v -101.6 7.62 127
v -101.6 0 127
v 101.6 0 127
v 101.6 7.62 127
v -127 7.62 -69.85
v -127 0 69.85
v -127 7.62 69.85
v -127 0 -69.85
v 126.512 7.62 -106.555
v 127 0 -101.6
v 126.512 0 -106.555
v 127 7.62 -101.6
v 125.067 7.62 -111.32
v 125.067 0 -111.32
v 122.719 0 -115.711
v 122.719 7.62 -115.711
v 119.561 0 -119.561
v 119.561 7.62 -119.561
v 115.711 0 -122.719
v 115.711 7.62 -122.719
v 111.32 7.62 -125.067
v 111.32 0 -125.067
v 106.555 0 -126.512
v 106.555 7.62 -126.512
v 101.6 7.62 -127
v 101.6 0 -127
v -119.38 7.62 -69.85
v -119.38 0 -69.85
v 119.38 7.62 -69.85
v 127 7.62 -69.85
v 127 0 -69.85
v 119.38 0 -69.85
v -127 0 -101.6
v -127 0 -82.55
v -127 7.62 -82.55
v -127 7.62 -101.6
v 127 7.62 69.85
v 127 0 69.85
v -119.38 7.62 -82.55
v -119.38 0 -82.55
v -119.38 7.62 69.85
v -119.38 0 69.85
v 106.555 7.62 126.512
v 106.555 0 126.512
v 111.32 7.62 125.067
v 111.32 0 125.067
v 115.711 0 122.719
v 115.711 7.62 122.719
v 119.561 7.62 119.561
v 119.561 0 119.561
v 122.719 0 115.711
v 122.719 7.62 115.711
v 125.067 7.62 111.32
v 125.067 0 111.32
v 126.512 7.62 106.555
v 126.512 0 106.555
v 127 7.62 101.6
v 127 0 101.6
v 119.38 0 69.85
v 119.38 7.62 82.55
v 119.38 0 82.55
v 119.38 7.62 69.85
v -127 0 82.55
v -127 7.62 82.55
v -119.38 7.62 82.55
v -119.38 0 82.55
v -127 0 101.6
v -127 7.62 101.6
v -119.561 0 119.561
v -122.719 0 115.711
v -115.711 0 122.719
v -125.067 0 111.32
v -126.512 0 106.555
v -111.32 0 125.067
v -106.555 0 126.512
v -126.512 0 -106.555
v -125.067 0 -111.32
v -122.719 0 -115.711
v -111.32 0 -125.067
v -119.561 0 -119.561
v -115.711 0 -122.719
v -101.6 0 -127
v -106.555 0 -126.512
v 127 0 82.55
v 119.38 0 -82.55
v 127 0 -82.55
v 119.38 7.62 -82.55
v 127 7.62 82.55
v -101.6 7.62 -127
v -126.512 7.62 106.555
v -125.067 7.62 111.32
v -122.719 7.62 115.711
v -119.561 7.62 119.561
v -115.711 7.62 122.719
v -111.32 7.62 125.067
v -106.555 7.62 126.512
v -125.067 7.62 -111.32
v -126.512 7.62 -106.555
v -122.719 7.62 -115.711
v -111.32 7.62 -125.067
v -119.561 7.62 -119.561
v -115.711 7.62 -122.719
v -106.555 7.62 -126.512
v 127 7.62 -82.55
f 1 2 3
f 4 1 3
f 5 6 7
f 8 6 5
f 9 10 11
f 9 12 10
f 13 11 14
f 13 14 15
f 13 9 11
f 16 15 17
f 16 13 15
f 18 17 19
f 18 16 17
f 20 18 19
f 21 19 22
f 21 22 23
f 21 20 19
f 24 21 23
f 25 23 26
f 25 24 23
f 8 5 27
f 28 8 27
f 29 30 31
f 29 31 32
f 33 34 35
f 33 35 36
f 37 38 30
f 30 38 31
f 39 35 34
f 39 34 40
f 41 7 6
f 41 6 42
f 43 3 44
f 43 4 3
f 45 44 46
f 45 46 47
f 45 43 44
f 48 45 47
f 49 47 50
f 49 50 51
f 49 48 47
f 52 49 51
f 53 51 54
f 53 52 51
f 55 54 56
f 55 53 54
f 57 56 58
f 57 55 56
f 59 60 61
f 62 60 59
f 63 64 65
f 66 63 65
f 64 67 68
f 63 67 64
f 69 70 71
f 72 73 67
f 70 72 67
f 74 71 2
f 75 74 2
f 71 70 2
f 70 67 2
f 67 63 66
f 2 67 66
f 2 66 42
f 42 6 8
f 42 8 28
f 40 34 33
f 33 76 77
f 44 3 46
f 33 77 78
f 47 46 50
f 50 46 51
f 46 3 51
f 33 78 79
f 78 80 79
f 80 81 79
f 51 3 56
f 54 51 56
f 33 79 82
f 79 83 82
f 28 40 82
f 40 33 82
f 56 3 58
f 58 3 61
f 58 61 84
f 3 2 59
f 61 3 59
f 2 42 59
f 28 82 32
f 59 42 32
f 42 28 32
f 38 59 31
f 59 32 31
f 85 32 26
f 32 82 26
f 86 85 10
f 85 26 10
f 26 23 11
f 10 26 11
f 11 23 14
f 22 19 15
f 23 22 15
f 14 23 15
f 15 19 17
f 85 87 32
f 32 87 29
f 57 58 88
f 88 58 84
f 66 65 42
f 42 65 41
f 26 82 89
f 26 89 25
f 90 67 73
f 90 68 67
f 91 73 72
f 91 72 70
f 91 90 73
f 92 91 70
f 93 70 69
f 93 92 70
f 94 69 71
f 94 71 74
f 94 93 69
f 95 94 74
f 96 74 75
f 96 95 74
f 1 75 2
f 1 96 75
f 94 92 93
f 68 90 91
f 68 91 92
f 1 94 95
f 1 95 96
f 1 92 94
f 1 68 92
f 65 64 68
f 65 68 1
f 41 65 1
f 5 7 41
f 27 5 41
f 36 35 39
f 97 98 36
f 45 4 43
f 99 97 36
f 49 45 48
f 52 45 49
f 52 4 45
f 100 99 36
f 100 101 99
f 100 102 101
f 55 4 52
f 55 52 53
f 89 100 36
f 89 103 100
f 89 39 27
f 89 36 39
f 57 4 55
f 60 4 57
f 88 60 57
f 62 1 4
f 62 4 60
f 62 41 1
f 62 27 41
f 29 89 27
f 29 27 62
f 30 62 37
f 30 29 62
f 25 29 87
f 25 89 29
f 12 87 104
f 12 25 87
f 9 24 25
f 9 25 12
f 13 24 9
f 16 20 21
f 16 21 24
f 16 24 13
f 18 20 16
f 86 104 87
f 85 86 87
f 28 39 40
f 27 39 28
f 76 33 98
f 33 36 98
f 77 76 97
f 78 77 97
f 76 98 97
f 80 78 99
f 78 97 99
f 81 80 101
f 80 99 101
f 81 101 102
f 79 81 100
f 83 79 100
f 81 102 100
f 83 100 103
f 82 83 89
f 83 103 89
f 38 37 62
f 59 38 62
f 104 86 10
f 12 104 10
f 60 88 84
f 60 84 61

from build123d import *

# Parameters (mm, degrees)
SKETCH1_W               = 254
SKETCH1_H               = 254
PLATFORM_BASE_DEPTH     = 7.62
CORNER_ROUNDING_R       = 25.4
SKETCH8_W               = 7.62
SKETCH8_H               = 12.7
CUT_EXTRUDE4_DEPTH      = 180.766694357
MIRROR7_COPY_1_SKETCH_W = 7.62
MIRROR7_COPY_1_SKETCH_H = 12.7
MIRROR7_COPY_1_DEPTH    = 180.766694357


with BuildPart() as part:
    # Sketch1 → Platform-Base (new body)
    with BuildSketch(Plane(origin=(0, 0, 0), x_dir=(1, 0, 0), z_dir=(0, 1, 0))):
        Rectangle(SKETCH1_W, SKETCH1_H)
    extrude(amount=PLATFORM_BASE_DEPTH)

    # Corner-Rounding
    corner_rounding_edges = [part.edges().sort_by_distance(p)[0] for p in [
        (127, 3.81, 127),
        (-127, 3.81, 127),
        (-127, 3.81, -127),
        (127, 3.81, -127),
    ]]
    fillet(corner_rounding_edges, radius=CORNER_ROUNDING_R)

    # Sketch8 → Cut-Extrude4 (cut, through all)
    with BuildSketch(Plane(origin=(0, 7.62, 0), x_dir=(1, 0, 0), z_dir=(0, 1, 0))):
        with Locations((-123.19, -76.2)):
            Rectangle(SKETCH8_W, SKETCH8_H)
    cut_extrude4 = extrude(amount=-CUT_EXTRUDE4_DEPTH, mode=Mode.SUBTRACT)

    # Mirror6: Cut-Extrude4 across plane
    add(cut_extrude4.mirror(Plane.XY), mode=Mode.SUBTRACT)

    # Mirror7: Cut-Extrude4 across plane
    add(cut_extrude4.mirror(Plane.ZY), mode=Mode.SUBTRACT)

    # Mirror7 copy 1 sketch → Mirror7 copy 1 (cut, through all)
    with BuildSketch(Plane(origin=(0, 7.62, 0), x_dir=(-1, 0, 0), z_dir=(0, 1, 0))):
        with Locations((-123.19, -76.2)):
            Rectangle(MIRROR7_COPY_1_SKETCH_W, MIRROR7_COPY_1_SKETCH_H)
    extrude(amount=-MIRROR7_COPY_1_DEPTH, mode=Mode.SUBTRACT)


solid = part.part
